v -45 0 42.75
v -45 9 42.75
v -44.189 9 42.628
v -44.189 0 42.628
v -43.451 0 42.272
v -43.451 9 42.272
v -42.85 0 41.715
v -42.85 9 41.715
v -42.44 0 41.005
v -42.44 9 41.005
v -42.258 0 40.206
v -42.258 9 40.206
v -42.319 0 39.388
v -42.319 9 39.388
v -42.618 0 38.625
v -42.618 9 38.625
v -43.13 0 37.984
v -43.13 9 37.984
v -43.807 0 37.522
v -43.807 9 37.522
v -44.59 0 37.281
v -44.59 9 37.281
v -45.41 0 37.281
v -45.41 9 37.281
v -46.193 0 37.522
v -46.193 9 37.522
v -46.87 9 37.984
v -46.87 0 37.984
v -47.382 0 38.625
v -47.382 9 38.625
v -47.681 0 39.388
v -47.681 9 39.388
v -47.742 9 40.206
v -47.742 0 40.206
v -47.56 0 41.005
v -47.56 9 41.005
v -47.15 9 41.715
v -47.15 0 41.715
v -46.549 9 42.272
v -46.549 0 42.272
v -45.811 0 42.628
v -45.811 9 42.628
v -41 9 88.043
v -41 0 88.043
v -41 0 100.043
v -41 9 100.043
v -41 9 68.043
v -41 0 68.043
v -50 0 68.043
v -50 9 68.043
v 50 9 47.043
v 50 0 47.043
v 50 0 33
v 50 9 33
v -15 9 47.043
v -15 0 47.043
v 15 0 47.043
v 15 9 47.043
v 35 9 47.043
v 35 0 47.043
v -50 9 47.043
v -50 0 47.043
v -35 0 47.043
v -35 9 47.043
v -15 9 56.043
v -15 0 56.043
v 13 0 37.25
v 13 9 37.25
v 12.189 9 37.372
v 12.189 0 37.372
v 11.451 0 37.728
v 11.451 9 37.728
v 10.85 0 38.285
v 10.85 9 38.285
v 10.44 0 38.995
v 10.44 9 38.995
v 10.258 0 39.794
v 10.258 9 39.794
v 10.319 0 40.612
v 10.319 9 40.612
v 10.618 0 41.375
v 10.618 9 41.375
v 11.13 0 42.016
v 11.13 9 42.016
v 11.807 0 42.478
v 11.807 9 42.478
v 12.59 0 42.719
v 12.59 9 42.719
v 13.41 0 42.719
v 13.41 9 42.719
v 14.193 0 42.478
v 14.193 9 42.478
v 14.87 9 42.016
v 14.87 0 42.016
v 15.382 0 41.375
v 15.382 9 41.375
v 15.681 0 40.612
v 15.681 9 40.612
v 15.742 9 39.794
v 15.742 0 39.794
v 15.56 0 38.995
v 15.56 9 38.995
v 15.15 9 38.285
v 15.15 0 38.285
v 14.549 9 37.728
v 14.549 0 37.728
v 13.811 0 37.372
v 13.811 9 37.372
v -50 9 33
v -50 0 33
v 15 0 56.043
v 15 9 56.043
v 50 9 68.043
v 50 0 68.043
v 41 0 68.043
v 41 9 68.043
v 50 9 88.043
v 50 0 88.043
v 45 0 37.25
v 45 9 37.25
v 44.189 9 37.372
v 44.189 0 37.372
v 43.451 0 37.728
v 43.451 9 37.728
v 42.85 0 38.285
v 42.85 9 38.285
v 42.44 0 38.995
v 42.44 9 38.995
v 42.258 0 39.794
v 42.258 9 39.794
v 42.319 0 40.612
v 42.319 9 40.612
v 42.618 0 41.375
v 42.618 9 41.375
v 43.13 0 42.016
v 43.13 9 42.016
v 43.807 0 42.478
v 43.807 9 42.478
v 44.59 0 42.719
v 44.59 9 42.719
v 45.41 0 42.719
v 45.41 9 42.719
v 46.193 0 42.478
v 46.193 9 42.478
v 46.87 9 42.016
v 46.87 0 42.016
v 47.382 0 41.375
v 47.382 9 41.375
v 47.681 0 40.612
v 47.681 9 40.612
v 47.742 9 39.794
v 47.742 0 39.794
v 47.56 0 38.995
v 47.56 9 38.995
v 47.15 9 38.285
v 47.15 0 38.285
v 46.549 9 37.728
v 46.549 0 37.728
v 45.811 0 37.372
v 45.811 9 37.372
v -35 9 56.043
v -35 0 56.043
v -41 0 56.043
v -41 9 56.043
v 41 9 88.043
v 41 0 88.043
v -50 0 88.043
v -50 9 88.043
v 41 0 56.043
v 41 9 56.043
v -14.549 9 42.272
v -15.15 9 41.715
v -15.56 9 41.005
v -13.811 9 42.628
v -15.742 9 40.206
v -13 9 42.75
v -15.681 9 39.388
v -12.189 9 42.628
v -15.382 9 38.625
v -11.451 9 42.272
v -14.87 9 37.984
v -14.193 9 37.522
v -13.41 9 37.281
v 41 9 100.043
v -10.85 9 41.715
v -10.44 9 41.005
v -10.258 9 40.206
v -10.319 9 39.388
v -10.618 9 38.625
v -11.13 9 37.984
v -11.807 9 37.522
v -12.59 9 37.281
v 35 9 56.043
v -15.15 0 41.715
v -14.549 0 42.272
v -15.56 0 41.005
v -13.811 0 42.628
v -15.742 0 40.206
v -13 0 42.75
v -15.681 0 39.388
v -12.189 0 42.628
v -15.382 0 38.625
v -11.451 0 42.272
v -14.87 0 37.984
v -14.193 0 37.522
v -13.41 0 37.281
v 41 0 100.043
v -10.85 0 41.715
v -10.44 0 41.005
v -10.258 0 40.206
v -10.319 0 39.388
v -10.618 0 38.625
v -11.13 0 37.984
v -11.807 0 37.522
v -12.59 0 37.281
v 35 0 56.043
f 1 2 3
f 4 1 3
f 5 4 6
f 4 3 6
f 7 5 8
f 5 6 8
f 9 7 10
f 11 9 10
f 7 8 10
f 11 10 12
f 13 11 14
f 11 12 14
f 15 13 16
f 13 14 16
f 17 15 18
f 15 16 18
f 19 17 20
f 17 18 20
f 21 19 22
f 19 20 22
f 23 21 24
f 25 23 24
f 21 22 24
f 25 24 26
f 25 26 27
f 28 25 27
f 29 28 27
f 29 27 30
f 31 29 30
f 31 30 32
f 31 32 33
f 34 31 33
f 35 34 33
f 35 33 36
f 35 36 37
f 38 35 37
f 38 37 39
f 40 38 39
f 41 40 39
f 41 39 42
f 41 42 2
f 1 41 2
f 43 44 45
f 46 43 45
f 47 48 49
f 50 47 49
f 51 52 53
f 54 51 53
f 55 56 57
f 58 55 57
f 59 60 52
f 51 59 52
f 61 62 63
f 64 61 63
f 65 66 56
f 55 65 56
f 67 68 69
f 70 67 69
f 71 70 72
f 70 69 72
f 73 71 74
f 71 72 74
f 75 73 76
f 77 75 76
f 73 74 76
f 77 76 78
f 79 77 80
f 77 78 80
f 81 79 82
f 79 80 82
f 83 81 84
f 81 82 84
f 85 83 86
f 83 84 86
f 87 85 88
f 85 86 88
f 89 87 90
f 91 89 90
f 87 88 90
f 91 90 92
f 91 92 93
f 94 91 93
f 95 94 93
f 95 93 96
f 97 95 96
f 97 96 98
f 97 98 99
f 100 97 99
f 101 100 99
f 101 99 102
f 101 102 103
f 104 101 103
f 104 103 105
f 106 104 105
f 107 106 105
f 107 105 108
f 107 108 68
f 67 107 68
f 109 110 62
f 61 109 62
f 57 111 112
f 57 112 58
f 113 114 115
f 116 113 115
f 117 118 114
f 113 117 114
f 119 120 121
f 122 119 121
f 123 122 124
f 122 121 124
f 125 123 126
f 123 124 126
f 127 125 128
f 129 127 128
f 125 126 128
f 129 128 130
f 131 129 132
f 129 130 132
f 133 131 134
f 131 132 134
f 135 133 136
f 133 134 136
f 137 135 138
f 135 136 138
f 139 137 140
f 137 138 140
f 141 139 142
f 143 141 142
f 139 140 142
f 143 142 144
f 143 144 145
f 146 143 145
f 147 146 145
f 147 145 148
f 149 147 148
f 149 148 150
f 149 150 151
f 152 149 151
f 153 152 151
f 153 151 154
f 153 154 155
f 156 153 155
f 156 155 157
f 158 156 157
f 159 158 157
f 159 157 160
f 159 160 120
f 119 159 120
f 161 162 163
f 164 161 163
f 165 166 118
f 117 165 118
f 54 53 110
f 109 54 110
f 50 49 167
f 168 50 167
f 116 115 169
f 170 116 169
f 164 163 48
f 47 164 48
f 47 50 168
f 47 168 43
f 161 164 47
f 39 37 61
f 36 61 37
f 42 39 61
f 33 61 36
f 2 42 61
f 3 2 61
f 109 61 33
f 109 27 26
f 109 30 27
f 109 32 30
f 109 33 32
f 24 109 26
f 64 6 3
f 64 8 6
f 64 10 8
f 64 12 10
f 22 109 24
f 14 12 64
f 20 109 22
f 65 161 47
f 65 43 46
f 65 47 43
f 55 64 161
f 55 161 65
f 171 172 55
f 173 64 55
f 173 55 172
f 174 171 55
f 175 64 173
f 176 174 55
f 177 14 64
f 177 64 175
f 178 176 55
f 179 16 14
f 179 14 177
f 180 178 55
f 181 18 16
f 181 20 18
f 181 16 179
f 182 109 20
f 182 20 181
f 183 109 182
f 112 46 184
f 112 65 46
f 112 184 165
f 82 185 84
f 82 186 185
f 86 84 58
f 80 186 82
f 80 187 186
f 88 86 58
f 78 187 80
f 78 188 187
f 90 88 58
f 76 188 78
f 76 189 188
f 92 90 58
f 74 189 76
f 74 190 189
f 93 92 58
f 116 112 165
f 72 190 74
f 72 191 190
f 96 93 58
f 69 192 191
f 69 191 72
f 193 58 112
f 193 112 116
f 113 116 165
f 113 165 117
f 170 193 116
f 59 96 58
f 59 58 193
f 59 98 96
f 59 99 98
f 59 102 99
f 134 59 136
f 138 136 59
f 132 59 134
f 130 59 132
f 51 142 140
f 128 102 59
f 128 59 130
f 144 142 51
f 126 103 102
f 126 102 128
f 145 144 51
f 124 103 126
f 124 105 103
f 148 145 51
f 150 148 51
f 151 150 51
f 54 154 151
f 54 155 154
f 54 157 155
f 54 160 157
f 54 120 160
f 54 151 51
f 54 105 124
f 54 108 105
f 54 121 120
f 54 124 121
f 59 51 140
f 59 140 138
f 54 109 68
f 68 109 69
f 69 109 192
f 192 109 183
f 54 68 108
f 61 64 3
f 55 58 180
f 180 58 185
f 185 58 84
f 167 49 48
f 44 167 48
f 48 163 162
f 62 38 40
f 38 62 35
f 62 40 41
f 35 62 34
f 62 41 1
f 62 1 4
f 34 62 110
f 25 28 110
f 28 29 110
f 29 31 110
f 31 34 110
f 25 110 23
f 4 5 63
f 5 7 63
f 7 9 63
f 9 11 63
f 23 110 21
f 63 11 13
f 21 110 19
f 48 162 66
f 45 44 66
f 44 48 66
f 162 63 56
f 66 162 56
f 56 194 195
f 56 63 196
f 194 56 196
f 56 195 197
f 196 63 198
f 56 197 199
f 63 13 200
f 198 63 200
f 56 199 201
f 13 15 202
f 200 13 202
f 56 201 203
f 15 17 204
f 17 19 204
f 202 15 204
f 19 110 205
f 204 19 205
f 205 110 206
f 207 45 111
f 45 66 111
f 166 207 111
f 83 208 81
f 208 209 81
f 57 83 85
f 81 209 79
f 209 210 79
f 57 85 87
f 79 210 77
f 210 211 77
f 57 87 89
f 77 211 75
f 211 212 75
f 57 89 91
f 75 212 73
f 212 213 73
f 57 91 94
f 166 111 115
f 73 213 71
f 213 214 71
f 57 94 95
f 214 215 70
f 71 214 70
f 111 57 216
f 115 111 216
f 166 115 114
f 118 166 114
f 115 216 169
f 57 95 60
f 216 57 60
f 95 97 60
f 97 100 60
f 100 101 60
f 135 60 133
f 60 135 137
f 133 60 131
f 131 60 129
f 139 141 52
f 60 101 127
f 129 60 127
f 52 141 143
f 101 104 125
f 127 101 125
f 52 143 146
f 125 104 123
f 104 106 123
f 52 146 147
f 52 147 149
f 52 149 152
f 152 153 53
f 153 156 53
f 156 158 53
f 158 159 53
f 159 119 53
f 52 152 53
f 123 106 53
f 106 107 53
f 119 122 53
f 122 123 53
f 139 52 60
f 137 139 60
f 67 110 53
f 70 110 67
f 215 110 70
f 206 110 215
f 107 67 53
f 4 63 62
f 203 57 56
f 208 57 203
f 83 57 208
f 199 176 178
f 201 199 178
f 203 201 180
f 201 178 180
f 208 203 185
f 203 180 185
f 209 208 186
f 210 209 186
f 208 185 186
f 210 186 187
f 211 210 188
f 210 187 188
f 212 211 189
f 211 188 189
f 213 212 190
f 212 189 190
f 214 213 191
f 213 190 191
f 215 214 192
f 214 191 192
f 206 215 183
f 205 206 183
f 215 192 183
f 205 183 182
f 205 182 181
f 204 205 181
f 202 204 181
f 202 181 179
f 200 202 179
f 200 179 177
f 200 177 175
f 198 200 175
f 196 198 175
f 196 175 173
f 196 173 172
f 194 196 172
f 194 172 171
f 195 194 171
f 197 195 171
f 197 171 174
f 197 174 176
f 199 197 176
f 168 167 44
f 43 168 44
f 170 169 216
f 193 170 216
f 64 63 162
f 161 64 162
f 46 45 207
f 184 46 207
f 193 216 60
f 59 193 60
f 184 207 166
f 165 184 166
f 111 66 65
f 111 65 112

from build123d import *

# Parameters (mm, degrees)
SKETCH1_W           = 30
SKETCH1_H           = 9
BOSS_EXTRUDE1_DEPTH = 9
SKETCH3_R           = 2.75
CUT_EXTRUDE1_DEPTH  = 113.202955527


with BuildPart() as part:
    # Sketch1 → Boss-Extrude1 (new body)
    with BuildSketch(Plane(origin=(0, 0, 0), x_dir=(1, 0, 0), z_dir=(0, 1, 0))):
        Polygon((50, -88.042507111), (50, -68.042507111), (41, -68.042507111), (41, -56.042507111), (35, -56.042507111), (35, -47.042507111), (50, -47.042507111), (50, -33), (-50, -33), (-50, -47.042507111), (-35, -47.042507111), (-35, -56.042507111), (-41, -56.042507111), (-41, -68.042507111), (-50, -68.042507111), (-50, -88.042507111), (-41, -88.042507111), (-41, -100.042507111), (41, -100.042507111), (41, -88.042507111), align=None)
        with Locations((0, -51.542507111)):
            Rectangle(SKETCH1_W, SKETCH1_H, mode=Mode.SUBTRACT)
    extrude(amount=BOSS_EXTRUDE1_DEPTH)

    # Sketch3 → Cut-Extrude1 (cut, through all)
    with BuildSketch(Plane(origin=(0, 9, 0), x_dir=(1, 0, 0), z_dir=(0, 1, 0))):
        with Locations(Location((-45, -40, 0), (0, 0, 270))):
            Circle(SKETCH3_R)
        with Locations(Location((-13, -40, 0), (0, 0, 270))):
            Circle(SKETCH3_R)
        with Locations(Location((13, -40, 0), (0, 0, 90))):
            Circle(SKETCH3_R)
        with Locations(Location((45, -40, 0), (0, 0, 90))):
            Circle(SKETCH3_R)
    extrude(amount=-CUT_EXTRUDE1_DEPTH, mode=Mode.SUBTRACT)


solid = part.part
